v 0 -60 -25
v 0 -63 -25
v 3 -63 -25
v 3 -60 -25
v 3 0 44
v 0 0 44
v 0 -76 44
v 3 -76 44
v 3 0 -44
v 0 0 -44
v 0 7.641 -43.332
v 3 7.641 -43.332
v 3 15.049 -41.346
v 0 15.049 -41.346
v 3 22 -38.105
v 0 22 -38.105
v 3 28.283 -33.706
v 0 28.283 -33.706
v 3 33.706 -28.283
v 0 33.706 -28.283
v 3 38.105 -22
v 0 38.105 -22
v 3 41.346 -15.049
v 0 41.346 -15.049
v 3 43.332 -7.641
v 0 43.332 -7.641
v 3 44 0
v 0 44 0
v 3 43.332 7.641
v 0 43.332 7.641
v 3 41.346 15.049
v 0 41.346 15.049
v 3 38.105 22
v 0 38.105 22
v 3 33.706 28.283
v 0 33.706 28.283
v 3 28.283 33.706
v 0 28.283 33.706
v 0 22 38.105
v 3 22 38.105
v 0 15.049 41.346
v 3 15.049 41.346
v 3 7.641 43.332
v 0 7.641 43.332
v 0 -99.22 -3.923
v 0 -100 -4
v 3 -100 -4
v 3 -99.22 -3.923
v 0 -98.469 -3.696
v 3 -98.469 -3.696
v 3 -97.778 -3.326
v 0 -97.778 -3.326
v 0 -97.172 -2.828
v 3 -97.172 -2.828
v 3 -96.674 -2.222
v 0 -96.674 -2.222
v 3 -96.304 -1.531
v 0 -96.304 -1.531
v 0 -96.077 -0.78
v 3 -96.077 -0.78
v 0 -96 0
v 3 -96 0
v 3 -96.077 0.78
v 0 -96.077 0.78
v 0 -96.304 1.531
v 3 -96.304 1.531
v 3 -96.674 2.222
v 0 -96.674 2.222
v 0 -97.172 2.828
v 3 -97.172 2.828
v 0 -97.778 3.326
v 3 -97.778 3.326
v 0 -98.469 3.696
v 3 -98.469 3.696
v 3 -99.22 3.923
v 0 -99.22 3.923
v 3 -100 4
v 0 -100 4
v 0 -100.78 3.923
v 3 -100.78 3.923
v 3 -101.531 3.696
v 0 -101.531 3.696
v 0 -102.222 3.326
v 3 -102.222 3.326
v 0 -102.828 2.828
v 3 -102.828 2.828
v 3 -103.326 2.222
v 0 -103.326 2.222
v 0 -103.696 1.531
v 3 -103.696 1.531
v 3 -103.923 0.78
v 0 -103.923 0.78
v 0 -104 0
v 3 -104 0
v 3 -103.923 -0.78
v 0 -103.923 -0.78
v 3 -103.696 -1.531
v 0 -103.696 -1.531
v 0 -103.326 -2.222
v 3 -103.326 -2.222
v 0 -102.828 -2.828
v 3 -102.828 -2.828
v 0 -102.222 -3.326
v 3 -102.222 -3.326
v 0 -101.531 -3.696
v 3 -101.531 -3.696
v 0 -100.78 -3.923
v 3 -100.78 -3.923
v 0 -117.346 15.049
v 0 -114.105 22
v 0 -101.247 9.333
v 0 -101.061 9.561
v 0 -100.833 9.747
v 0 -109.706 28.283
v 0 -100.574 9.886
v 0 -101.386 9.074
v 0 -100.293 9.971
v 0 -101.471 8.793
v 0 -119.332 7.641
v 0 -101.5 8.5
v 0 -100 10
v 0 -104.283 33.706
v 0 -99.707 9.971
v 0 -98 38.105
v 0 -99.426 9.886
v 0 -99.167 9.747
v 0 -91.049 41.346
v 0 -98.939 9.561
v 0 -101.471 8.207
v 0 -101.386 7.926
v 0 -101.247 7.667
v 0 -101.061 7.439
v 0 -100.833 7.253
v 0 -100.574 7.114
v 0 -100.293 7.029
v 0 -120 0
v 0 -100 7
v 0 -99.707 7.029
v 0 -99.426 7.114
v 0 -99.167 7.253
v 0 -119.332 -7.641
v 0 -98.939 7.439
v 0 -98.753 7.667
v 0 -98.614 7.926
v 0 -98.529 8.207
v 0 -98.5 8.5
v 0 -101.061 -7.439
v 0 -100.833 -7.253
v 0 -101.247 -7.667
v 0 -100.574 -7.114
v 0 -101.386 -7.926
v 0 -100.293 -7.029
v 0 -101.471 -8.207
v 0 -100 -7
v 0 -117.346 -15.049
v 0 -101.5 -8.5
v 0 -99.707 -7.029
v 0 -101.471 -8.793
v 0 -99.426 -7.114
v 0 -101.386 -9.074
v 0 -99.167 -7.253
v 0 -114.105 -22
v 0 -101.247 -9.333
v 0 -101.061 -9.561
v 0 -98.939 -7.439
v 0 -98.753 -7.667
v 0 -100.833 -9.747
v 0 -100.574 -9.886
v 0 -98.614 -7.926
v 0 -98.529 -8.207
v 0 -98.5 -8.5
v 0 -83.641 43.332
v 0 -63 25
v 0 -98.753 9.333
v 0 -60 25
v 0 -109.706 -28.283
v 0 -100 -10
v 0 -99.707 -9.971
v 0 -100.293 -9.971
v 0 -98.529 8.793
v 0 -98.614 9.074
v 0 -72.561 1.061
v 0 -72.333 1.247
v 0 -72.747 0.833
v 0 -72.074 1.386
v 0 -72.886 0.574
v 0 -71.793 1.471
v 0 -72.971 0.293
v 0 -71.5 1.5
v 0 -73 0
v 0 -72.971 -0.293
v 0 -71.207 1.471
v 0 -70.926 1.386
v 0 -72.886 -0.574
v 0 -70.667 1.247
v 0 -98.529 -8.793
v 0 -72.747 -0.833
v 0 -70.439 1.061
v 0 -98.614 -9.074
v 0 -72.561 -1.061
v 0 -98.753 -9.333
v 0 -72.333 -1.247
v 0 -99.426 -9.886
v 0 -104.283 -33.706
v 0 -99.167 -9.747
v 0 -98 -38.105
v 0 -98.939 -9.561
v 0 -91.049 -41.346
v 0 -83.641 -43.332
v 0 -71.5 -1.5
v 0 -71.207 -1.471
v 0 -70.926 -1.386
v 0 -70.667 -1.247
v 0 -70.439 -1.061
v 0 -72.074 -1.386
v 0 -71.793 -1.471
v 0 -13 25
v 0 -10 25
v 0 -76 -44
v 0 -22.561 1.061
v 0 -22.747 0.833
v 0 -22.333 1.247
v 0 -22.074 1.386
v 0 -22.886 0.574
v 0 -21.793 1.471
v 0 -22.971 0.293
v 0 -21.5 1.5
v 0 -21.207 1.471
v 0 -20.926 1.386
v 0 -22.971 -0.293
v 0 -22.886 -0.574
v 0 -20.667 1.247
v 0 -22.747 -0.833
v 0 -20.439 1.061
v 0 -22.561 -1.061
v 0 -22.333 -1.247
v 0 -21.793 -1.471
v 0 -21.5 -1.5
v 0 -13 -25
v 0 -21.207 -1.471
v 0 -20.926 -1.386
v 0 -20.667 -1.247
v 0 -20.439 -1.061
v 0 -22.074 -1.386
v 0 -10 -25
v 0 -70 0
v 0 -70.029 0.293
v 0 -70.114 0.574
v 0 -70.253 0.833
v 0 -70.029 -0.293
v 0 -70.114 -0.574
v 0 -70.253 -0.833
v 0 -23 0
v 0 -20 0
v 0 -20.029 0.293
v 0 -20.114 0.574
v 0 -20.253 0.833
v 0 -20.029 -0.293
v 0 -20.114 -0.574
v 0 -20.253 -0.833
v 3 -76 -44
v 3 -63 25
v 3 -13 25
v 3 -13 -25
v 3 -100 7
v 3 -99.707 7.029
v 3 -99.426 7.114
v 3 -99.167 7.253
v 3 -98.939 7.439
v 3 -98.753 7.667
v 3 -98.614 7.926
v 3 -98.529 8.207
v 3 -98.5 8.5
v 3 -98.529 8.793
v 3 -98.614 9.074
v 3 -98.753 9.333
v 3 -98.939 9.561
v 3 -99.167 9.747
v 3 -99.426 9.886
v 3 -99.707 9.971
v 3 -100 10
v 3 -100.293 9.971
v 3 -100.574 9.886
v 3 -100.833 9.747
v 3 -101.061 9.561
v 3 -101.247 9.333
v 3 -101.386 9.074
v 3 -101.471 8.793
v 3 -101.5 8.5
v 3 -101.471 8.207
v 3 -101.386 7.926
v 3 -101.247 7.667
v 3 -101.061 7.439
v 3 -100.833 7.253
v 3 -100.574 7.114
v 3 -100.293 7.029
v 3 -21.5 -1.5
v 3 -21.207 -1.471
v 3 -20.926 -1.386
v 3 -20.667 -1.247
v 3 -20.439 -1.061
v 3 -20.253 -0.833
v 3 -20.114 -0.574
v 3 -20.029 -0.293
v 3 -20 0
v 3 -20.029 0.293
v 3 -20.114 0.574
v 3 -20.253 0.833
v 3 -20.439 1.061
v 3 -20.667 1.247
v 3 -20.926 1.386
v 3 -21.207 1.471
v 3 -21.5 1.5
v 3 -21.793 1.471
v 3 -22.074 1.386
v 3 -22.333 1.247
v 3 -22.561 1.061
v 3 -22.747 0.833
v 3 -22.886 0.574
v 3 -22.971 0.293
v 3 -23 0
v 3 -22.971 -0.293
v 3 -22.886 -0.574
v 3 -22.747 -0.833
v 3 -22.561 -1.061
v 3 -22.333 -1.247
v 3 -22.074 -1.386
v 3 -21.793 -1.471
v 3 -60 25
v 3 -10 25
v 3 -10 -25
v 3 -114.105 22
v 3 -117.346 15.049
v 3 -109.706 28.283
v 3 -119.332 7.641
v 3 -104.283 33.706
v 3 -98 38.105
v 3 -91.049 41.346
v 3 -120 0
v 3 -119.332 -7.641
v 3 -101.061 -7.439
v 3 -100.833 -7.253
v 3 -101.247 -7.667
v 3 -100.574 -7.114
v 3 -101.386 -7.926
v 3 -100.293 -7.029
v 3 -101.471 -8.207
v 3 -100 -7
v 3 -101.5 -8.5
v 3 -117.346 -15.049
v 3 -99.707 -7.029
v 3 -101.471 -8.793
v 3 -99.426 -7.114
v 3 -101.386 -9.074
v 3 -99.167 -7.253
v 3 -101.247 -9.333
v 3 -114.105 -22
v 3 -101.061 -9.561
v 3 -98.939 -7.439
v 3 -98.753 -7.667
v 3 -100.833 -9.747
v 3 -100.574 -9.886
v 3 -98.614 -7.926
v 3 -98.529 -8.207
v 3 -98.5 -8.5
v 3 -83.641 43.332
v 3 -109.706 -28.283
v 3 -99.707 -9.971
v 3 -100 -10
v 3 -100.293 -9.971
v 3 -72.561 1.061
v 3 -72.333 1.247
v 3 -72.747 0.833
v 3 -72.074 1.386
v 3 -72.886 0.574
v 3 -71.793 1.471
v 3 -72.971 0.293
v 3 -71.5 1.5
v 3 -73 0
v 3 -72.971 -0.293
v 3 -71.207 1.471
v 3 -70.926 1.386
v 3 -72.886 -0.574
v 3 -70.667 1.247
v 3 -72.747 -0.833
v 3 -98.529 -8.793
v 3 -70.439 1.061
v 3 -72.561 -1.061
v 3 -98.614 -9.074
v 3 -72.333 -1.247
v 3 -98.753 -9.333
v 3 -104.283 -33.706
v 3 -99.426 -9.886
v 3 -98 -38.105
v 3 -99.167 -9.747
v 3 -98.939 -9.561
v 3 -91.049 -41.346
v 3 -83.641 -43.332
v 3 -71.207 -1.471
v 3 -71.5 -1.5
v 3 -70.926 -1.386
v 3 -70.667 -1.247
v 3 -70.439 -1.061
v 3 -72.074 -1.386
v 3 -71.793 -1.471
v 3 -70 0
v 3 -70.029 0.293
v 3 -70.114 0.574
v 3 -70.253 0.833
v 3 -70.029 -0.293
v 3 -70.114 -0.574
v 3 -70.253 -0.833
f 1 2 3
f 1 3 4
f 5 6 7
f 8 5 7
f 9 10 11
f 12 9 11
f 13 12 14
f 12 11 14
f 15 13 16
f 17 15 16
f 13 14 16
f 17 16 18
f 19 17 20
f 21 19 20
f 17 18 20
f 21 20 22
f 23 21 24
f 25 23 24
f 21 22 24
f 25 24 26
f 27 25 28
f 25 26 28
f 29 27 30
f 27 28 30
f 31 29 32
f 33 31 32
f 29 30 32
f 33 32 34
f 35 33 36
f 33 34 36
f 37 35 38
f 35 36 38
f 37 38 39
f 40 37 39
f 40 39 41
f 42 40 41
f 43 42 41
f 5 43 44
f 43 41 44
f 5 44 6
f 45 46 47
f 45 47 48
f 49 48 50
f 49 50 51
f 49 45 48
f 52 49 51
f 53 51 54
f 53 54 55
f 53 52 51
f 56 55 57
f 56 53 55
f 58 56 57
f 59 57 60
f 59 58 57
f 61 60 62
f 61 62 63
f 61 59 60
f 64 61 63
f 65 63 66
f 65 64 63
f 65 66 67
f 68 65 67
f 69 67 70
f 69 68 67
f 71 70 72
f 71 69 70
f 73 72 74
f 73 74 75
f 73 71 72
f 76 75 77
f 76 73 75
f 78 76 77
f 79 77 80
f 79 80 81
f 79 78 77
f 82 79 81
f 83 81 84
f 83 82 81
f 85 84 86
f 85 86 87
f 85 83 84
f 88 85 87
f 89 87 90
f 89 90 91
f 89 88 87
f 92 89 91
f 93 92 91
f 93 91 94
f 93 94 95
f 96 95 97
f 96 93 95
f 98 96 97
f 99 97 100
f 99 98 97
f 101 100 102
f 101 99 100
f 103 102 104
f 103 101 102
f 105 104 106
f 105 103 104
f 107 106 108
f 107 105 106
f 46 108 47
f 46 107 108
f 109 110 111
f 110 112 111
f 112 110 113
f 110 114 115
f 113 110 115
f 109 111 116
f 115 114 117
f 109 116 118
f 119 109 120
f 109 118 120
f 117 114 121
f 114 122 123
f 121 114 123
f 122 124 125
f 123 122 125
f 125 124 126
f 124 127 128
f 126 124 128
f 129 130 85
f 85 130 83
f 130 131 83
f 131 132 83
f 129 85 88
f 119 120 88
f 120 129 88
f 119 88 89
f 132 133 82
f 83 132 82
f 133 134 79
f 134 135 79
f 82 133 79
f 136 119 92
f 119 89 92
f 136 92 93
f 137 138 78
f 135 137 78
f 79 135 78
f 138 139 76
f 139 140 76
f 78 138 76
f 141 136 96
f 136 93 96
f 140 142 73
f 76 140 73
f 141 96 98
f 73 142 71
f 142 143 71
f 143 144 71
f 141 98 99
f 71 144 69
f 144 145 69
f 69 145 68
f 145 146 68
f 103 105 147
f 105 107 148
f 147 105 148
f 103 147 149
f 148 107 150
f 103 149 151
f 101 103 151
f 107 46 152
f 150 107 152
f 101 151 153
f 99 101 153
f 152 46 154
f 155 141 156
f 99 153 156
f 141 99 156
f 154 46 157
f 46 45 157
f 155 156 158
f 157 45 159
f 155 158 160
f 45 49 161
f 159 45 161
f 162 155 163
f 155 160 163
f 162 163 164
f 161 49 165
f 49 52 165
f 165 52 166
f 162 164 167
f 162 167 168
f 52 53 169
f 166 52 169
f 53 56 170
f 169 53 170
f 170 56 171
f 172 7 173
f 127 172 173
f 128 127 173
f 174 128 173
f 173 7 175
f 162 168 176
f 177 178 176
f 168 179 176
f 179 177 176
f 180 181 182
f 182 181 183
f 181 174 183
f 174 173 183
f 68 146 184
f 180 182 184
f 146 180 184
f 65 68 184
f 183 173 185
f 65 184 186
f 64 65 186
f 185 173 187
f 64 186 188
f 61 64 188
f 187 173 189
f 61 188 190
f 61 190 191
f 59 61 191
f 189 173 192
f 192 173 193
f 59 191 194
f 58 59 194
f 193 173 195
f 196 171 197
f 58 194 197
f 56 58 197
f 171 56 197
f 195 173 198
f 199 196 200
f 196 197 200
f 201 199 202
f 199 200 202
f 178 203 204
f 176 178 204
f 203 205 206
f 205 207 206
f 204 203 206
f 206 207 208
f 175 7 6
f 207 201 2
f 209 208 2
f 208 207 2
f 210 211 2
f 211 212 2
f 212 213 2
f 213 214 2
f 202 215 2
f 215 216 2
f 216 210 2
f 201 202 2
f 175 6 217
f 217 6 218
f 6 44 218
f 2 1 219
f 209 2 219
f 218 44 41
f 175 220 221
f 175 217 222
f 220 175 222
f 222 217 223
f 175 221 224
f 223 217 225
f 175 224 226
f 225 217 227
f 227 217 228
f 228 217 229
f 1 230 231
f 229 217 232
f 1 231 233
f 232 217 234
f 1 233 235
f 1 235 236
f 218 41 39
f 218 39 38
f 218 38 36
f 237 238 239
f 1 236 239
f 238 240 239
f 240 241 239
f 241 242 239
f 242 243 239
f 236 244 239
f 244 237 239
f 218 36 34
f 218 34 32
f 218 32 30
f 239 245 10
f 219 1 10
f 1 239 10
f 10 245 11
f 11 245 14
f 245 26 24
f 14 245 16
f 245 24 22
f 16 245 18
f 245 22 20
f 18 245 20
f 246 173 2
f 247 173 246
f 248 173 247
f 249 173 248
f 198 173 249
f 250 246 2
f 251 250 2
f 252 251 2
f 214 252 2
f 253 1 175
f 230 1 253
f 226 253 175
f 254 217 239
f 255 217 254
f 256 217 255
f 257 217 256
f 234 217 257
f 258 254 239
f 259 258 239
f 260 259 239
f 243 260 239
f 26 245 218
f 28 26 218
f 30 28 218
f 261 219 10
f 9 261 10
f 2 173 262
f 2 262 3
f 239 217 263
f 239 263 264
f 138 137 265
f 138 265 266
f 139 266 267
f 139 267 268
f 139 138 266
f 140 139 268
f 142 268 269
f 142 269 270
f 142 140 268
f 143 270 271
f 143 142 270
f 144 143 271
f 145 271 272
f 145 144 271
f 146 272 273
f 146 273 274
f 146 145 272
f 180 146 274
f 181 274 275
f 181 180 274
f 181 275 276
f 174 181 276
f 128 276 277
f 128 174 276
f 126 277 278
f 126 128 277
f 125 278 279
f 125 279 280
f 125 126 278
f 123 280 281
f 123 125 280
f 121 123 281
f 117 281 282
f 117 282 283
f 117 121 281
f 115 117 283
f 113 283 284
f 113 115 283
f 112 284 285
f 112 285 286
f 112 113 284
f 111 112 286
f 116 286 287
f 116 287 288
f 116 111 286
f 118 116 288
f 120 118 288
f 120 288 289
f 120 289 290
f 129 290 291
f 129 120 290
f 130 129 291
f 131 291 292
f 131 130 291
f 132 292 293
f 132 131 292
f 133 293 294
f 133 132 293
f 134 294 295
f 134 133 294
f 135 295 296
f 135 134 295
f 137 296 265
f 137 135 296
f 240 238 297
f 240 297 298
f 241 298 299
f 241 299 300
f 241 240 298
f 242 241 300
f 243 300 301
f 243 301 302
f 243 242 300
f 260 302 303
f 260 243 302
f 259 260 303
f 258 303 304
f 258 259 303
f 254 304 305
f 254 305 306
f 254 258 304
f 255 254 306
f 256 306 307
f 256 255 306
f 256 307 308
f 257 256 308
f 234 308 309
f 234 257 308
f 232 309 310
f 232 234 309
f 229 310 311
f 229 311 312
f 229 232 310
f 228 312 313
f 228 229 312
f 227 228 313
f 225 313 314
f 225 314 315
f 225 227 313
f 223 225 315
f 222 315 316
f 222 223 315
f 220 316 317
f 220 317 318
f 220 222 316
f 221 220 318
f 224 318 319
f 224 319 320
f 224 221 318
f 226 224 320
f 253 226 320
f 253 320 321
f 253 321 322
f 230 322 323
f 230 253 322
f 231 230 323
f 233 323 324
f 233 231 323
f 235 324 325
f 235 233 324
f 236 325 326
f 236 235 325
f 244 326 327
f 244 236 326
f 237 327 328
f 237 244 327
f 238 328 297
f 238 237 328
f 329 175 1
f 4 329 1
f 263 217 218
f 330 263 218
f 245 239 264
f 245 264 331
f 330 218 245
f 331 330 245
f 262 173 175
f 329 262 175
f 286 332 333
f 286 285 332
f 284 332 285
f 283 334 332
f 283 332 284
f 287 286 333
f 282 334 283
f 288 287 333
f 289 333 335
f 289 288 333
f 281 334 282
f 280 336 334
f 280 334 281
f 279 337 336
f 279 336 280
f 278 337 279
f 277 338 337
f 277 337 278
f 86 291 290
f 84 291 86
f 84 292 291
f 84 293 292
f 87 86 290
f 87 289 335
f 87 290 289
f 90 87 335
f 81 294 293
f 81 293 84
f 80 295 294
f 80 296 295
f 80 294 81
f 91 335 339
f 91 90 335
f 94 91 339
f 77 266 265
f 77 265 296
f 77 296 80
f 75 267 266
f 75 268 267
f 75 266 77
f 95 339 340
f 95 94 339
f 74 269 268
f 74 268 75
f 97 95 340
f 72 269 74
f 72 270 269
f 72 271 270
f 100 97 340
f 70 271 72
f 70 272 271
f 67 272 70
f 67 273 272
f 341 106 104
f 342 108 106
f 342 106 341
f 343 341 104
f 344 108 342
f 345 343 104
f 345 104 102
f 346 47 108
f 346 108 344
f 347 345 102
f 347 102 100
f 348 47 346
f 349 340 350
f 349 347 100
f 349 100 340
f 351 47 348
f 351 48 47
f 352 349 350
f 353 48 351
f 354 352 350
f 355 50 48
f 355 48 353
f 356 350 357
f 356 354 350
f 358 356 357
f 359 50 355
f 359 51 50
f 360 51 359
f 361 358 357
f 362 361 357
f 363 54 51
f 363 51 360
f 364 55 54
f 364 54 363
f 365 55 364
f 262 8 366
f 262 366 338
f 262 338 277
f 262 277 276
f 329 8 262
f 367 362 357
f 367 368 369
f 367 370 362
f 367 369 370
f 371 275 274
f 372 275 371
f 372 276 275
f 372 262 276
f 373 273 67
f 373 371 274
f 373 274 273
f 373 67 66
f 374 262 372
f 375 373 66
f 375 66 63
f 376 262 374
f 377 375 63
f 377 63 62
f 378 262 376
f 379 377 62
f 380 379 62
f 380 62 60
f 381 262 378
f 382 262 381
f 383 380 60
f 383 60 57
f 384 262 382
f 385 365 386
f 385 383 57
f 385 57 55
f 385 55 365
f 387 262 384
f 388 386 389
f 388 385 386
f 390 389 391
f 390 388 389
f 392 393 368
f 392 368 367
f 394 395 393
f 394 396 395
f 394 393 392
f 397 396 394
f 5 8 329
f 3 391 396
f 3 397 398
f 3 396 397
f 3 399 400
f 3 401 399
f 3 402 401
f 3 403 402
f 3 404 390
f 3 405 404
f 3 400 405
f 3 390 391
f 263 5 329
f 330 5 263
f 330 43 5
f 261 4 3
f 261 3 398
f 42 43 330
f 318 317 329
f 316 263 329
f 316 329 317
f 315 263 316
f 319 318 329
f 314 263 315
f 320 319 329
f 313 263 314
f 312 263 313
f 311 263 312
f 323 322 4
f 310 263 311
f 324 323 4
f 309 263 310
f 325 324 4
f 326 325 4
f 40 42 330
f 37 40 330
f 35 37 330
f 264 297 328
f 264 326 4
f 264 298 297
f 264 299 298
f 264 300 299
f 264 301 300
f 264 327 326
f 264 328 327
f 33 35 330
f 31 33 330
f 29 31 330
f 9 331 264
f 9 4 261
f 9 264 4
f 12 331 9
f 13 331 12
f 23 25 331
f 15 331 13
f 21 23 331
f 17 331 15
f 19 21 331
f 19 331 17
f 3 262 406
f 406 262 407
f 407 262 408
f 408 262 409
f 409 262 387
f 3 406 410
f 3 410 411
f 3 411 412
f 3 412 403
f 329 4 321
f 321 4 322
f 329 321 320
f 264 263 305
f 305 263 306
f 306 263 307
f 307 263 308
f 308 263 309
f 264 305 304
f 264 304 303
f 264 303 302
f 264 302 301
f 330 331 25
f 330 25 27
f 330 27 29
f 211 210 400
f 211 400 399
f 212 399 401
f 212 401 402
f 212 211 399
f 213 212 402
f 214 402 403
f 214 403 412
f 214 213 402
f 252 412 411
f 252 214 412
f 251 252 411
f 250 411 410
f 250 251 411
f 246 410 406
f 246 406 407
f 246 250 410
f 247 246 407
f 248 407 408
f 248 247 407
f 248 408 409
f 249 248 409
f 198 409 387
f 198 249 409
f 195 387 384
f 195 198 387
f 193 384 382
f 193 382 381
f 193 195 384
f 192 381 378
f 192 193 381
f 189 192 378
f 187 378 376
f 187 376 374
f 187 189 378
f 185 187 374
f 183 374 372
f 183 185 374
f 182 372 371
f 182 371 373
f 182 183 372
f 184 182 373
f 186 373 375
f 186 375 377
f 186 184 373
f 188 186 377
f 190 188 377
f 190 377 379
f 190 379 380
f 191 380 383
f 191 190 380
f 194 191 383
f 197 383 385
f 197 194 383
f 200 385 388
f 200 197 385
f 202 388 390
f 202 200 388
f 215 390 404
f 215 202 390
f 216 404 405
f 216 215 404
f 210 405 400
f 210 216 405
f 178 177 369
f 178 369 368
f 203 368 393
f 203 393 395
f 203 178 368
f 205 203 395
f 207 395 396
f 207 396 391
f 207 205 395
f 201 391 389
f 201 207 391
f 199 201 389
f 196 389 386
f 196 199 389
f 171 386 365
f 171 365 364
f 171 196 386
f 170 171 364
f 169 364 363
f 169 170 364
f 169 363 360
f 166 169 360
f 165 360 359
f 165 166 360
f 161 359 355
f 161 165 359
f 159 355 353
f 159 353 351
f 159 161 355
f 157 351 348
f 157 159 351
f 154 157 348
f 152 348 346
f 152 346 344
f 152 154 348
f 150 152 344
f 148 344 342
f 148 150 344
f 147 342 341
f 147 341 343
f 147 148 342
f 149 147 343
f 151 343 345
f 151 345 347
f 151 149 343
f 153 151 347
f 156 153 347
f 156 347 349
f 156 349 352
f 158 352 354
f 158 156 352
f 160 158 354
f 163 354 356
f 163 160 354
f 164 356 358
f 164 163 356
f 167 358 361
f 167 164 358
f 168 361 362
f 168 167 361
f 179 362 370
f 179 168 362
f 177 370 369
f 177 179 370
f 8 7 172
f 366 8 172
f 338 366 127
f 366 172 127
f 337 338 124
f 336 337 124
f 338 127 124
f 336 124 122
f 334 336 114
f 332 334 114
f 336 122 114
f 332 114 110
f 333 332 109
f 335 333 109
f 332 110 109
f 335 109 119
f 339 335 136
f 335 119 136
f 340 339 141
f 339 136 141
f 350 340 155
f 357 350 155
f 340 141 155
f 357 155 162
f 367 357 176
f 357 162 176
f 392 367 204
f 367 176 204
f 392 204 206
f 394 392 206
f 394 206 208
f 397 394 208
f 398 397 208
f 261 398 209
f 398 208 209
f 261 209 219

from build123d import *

# Parameters (mm, degrees)
SKETCH1_R           = 1.5
SKETCH1_R_2         = 4
SKETCH1_W           = 50
SKETCH1_H           = 3
BOSS_EXTRUDE1_DEPTH = 3


with BuildPart() as part:
    # Sketch1 → Boss-Extrude1 (new body)
    with BuildSketch(Plane(origin=(0, 0, 0), x_dir=(0, 0, -1), z_dir=(1, 0, 0))):
        with BuildLine():
            Line((-44, 0), (-44, -76))
            ThreePointArc((-44, -76), (0, -120), (44, -76))
            Line((44, -76), (44, 0))
            ThreePointArc((44, 0), (0, 44), (-44, 0))
        make_face()
        with Locations((0, -21.5)):
            Circle(SKETCH1_R, mode=Mode.SUBTRACT)
        with Locations((0, -71.5)):
            Circle(SKETCH1_R, mode=Mode.SUBTRACT)
        with Locations((0, -100)):
            Circle(SKETCH1_R_2, mode=Mode.SUBTRACT)
        with Locations((-8.5, -100)):
            Circle(SKETCH1_R, mode=Mode.SUBTRACT)
        with Locations((8.5, -100)):
            Circle(SKETCH1_R, mode=Mode.SUBTRACT)
        with Locations((0, -11.5)):
            Rectangle(SKETCH1_W, SKETCH1_H, mode=Mode.SUBTRACT)
        with Locations((0, -61.5)):
            Rectangle(SKETCH1_W, SKETCH1_H, mode=Mode.SUBTRACT)
    extrude(amount=BOSS_EXTRUDE1_DEPTH)


solid = part.part
